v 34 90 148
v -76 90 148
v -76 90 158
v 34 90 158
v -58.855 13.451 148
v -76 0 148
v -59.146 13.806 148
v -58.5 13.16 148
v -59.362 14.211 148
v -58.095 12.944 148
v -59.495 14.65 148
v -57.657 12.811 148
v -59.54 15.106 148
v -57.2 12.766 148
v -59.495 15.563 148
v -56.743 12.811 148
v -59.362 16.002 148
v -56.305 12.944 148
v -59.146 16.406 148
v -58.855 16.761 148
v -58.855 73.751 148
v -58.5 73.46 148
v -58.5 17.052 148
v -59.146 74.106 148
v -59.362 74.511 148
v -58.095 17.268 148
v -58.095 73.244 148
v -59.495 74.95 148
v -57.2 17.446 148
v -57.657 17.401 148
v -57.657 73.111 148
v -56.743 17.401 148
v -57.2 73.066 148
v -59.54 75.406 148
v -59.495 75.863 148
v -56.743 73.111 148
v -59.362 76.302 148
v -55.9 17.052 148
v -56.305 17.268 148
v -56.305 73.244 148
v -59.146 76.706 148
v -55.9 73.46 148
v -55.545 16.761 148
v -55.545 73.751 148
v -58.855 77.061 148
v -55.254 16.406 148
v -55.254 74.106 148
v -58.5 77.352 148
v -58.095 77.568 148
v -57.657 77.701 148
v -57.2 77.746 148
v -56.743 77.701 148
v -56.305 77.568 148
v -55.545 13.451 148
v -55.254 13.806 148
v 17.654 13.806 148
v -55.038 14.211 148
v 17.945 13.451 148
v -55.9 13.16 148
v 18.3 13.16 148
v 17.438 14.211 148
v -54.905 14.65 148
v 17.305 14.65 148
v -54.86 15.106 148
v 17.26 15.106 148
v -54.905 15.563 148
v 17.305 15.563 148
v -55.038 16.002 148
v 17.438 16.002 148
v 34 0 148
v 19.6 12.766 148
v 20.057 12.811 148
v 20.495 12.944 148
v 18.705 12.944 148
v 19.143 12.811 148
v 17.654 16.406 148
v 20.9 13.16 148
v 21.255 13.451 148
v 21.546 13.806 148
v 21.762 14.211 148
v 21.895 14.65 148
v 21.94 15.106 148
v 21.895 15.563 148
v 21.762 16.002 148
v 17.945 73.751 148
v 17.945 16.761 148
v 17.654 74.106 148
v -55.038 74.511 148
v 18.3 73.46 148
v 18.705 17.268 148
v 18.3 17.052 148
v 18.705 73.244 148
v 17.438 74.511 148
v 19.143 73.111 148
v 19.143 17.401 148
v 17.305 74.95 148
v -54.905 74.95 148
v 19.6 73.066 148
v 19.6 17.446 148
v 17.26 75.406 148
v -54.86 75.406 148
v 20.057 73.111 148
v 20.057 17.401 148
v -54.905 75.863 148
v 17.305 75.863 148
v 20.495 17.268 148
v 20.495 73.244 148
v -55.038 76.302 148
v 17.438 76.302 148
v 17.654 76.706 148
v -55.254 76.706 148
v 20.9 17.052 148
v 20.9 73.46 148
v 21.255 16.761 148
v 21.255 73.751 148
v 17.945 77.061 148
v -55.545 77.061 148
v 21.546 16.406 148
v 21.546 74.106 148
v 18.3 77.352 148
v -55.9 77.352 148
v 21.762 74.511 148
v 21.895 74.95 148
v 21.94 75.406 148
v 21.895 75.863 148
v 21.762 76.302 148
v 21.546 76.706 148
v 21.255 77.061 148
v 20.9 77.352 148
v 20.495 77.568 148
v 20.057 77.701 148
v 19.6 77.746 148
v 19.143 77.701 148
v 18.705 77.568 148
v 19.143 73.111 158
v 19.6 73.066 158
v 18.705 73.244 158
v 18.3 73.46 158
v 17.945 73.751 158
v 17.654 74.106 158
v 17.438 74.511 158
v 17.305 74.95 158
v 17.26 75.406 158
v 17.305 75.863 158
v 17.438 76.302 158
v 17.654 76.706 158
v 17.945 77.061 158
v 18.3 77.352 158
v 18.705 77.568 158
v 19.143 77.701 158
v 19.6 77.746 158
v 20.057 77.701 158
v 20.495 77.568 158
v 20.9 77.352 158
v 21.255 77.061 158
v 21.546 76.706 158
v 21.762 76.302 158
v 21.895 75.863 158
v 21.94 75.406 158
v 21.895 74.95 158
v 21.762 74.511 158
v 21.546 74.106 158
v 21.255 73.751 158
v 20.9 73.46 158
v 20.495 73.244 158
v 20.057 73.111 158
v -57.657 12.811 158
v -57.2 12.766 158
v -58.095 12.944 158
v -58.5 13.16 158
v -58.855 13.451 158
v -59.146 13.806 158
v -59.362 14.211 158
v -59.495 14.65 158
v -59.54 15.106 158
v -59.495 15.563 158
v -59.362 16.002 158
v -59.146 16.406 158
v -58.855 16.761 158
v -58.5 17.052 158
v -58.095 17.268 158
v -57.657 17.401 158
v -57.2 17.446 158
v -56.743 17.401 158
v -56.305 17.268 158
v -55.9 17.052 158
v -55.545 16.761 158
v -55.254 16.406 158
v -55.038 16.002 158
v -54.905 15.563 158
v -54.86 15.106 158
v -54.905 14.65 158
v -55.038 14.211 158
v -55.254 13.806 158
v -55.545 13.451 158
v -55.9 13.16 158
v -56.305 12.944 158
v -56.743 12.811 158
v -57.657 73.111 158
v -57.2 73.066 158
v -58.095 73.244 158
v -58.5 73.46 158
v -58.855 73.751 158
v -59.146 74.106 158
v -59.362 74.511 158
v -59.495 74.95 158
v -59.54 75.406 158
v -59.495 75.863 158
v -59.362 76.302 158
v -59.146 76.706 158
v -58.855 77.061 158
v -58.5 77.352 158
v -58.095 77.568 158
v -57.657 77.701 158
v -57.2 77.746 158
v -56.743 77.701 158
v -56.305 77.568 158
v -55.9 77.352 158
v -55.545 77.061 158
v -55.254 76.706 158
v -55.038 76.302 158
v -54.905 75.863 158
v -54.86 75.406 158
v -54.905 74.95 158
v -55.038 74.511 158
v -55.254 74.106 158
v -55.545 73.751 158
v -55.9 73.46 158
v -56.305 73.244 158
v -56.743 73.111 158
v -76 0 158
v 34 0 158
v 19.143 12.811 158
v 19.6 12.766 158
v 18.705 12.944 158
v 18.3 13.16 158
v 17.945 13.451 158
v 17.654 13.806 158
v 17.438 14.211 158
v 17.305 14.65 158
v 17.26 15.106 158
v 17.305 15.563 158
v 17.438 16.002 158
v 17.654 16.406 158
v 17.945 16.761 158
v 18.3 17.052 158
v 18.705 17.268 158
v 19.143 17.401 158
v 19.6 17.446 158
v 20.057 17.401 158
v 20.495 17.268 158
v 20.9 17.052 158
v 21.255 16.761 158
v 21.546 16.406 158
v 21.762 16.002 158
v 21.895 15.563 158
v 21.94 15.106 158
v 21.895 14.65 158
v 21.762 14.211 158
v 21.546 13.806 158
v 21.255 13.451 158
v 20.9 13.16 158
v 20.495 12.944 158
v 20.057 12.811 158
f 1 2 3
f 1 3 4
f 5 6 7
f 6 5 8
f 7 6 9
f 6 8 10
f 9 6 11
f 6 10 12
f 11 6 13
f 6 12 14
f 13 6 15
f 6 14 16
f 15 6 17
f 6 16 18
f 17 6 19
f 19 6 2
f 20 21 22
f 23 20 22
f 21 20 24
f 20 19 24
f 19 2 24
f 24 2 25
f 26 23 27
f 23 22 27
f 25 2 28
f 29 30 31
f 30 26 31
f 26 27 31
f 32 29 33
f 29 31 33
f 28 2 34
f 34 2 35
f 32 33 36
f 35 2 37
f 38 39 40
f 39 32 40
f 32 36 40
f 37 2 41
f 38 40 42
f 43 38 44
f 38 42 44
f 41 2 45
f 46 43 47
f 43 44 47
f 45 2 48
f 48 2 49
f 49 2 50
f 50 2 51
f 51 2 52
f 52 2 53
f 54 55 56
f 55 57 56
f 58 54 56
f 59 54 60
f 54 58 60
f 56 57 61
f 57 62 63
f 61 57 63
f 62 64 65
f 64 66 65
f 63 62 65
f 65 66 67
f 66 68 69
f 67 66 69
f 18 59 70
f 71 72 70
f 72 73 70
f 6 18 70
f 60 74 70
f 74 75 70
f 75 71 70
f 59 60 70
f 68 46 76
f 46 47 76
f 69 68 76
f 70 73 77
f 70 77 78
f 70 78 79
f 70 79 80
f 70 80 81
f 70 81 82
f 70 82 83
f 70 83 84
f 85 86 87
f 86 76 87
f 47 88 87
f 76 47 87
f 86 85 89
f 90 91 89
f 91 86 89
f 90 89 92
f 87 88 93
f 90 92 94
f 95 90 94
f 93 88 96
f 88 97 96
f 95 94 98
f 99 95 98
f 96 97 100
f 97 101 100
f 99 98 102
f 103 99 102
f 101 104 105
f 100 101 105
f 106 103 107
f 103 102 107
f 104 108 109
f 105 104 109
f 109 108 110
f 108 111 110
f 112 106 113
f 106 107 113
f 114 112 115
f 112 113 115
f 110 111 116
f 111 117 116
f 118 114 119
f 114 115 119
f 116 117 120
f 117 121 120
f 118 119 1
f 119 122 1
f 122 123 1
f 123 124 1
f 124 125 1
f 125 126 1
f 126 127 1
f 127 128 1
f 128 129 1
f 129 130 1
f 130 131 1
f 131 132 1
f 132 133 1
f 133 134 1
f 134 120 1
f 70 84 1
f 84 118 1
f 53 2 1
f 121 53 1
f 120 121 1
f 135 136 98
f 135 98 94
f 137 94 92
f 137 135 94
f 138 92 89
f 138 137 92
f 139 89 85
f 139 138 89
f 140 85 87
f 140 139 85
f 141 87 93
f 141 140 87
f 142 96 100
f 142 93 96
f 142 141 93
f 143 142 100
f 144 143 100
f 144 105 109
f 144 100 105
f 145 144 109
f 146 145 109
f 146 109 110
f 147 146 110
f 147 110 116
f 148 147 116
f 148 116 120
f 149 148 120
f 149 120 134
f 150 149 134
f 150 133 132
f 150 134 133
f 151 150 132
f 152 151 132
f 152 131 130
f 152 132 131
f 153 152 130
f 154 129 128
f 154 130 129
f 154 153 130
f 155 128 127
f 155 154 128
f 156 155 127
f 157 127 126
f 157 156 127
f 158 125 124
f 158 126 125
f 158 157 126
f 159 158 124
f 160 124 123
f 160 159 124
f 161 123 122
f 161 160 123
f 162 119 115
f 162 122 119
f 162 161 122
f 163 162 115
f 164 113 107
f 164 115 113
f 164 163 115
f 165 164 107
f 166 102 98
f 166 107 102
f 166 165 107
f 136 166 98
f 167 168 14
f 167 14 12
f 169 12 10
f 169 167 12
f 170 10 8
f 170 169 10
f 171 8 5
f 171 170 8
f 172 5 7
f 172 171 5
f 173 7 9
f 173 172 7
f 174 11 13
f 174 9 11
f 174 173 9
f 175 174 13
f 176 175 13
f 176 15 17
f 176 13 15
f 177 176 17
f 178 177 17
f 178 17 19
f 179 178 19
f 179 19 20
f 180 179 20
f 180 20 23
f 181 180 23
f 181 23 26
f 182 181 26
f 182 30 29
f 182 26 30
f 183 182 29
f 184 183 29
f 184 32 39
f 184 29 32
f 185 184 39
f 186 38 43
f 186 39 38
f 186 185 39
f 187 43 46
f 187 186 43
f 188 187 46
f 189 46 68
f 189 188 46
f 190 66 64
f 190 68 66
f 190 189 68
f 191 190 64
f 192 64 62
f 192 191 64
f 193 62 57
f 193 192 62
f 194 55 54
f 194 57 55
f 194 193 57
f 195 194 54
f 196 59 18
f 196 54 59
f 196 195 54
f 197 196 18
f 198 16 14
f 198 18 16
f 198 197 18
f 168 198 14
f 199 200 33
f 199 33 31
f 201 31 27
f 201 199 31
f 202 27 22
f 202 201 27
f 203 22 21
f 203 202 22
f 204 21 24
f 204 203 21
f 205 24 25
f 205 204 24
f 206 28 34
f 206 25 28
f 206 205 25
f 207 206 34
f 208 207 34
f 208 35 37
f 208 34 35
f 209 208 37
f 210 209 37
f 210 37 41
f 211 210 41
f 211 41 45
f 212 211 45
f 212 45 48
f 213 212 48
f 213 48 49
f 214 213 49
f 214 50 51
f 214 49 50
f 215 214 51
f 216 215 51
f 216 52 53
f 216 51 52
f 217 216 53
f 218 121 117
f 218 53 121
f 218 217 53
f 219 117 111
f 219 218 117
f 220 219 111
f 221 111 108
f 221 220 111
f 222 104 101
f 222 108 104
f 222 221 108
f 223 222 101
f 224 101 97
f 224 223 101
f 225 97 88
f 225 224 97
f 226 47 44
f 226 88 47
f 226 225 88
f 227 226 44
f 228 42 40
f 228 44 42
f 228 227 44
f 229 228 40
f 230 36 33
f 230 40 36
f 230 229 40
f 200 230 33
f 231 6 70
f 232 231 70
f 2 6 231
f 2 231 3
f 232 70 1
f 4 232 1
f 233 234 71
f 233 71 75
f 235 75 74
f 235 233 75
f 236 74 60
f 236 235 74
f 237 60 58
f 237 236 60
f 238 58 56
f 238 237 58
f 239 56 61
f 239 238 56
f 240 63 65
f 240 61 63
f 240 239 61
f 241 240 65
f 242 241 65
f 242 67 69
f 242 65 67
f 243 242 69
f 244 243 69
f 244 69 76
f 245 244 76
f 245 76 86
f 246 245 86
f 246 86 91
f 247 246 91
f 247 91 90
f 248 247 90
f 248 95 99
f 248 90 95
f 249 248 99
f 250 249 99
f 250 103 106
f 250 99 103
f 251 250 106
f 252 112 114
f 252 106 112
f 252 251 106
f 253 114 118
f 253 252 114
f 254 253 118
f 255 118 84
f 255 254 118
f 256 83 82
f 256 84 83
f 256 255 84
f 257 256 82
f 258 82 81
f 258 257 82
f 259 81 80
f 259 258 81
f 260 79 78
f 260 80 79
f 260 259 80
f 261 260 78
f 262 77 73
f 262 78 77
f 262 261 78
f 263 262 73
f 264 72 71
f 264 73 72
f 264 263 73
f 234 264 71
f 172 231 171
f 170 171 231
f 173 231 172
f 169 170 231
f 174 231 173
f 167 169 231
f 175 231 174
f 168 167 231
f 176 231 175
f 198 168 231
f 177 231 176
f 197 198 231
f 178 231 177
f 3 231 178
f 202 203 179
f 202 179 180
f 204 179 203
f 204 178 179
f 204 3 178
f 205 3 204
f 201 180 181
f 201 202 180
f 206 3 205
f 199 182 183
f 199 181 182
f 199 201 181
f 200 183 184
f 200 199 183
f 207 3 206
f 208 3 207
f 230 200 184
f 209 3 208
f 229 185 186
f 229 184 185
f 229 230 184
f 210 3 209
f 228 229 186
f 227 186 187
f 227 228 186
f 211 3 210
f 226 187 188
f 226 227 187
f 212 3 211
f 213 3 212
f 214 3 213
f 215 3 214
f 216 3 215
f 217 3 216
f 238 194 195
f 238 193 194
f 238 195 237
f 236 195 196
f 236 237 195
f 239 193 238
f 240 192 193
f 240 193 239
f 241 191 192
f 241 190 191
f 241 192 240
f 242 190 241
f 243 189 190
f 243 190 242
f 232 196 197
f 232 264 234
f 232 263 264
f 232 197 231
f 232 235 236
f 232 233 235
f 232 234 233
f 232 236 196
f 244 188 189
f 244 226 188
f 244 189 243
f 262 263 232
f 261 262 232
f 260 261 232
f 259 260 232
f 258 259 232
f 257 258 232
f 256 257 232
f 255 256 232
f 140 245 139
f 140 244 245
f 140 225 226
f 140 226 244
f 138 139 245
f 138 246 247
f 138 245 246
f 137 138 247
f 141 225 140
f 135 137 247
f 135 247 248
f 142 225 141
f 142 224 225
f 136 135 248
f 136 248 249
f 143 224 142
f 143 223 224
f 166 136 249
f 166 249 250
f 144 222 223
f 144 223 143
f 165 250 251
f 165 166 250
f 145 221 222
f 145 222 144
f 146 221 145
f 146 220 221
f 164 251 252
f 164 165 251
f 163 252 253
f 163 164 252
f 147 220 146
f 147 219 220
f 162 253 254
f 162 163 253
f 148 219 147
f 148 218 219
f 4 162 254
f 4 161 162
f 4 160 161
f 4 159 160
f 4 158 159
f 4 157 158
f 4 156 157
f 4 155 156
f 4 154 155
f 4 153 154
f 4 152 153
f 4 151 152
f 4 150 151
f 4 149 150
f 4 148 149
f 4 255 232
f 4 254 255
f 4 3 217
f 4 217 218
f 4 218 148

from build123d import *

# Parameters (mm, degrees)
SKETCH054_R                = 2.34
EXTRUDE056_DEPTH           = 20
EXTRUDE056_PLACEMENT_ANGLE = 90
SKETCH055_R                = 2.34
EXTRUDE057_DEPTH           = 20
EXTRUDE057_PLACEMENT_ANGLE = 90
SKETCH056_R                = 2.34
EXTRUDE058_DEPTH           = 20
EXTRUDE058_PLACEMENT_ANGLE = 90
SKETCH053_R                = 2.34
EXTRUDE055_DEPTH           = 20
EXTRUDE055_PLACEMENT_ANGLE = 90
SKETCH023_W                = 110
SKETCH023_H                = 90
EXTRUDE026_DEPTH           = 10


with BuildPart() as tornillos012:
    # Sketch054 → Extrude056 (new body)
    with BuildSketch(Plane(origin=(-98, -107, 0), x_dir=(0, -1, 0), z_dir=(-1, 0, 0))):
        with Locations((-135.006037, 30)):
            Circle(SKETCH054_R)
    extrude(amount=EXTRUDE056_DEPTH)


with BuildPart() as tornillos012_1:
    # Extrude056 placement: moved
    add(tornillos012.part.moved(Location((-27.2, 47.4, 257.8))).rotate(Axis((-27.2, 47.4, 257.8), (0, -1, 0)), EXTRUDE056_PLACEMENT_ANGLE))


with BuildPart() as tornillos013:
    # Sketch055 → Extrude057 (new body)
    with BuildSketch(Plane(origin=(-98, -107, 0), x_dir=(0, -1, 0), z_dir=(-1, 0, 0))):
        with Locations((-135.006037, 30)):
            Circle(SKETCH055_R)
    extrude(amount=EXTRUDE057_DEPTH)


with BuildPart() as tornillos013_1:
    # Extrude057 placement: moved
    add(tornillos013.part.moved(Location((49.6, -12.9, 257.8))).rotate(Axis((49.6, -12.9, 257.8), (0, -1, 0)), EXTRUDE057_PLACEMENT_ANGLE))


with BuildPart() as tornillos014:
    # Sketch056 → Extrude058 (new body)
    with BuildSketch(Plane(origin=(-98, -107, 0), x_dir=(0, -1, 0), z_dir=(-1, 0, 0))):
        with Locations((-135.006037, 30)):
            Circle(SKETCH056_R)
    extrude(amount=EXTRUDE058_DEPTH)


with BuildPart() as tornillos014_1:
    # Extrude058 placement: moved
    add(tornillos014.part.moved(Location((49.6, 47.4, 257.8))).rotate(Axis((49.6, 47.4, 257.8), (0, -1, 0)), EXTRUDE058_PLACEMENT_ANGLE))


with BuildPart() as tornillos011:
    # Sketch053 → Extrude055 (new body)
    with BuildSketch(Plane(origin=(-98, -107, 0), x_dir=(0, -1, 0), z_dir=(-1, 0, 0))):
        with Locations((-135.006037, 30)):
            Circle(SKETCH053_R)
    extrude(amount=EXTRUDE055_DEPTH)


with BuildPart() as tornillos011_1:
    # Extrude055 placement: moved
    add(tornillos011.part.moved(Location((-27.2, -12.9, 257.8))).rotate(Axis((-27.2, -12.9, 257.8), (0, -1, 0)), EXTRUDE055_PLACEMENT_ANGLE))


with BuildPart() as techo:
    # Sketch023 → Extrude026 (new body)
    with BuildSketch(Plane.XY):
        with Locations((-45, 45)):
            Rectangle(SKETCH023_W, SKETCH023_H)
    extrude(amount=EXTRUDE026_DEPTH)


with BuildPart() as techo_1:
    # Extrude026 placement: moved
    add(techo.part.moved(Location((24, 0, 148))))

    # Cut026: cut Tornillos011
    add(tornillos011_1.part, mode=Mode.SUBTRACT)

    # Cut027: cut Tornillos014
    add(tornillos014_1.part, mode=Mode.SUBTRACT)

    # Cut028: cut Tornillos013
    add(tornillos013_1.part, mode=Mode.SUBTRACT)

    # Cut029: cut Tornillos012
    add(tornillos012_1.part, mode=Mode.SUBTRACT)


solid = techo_1.part
